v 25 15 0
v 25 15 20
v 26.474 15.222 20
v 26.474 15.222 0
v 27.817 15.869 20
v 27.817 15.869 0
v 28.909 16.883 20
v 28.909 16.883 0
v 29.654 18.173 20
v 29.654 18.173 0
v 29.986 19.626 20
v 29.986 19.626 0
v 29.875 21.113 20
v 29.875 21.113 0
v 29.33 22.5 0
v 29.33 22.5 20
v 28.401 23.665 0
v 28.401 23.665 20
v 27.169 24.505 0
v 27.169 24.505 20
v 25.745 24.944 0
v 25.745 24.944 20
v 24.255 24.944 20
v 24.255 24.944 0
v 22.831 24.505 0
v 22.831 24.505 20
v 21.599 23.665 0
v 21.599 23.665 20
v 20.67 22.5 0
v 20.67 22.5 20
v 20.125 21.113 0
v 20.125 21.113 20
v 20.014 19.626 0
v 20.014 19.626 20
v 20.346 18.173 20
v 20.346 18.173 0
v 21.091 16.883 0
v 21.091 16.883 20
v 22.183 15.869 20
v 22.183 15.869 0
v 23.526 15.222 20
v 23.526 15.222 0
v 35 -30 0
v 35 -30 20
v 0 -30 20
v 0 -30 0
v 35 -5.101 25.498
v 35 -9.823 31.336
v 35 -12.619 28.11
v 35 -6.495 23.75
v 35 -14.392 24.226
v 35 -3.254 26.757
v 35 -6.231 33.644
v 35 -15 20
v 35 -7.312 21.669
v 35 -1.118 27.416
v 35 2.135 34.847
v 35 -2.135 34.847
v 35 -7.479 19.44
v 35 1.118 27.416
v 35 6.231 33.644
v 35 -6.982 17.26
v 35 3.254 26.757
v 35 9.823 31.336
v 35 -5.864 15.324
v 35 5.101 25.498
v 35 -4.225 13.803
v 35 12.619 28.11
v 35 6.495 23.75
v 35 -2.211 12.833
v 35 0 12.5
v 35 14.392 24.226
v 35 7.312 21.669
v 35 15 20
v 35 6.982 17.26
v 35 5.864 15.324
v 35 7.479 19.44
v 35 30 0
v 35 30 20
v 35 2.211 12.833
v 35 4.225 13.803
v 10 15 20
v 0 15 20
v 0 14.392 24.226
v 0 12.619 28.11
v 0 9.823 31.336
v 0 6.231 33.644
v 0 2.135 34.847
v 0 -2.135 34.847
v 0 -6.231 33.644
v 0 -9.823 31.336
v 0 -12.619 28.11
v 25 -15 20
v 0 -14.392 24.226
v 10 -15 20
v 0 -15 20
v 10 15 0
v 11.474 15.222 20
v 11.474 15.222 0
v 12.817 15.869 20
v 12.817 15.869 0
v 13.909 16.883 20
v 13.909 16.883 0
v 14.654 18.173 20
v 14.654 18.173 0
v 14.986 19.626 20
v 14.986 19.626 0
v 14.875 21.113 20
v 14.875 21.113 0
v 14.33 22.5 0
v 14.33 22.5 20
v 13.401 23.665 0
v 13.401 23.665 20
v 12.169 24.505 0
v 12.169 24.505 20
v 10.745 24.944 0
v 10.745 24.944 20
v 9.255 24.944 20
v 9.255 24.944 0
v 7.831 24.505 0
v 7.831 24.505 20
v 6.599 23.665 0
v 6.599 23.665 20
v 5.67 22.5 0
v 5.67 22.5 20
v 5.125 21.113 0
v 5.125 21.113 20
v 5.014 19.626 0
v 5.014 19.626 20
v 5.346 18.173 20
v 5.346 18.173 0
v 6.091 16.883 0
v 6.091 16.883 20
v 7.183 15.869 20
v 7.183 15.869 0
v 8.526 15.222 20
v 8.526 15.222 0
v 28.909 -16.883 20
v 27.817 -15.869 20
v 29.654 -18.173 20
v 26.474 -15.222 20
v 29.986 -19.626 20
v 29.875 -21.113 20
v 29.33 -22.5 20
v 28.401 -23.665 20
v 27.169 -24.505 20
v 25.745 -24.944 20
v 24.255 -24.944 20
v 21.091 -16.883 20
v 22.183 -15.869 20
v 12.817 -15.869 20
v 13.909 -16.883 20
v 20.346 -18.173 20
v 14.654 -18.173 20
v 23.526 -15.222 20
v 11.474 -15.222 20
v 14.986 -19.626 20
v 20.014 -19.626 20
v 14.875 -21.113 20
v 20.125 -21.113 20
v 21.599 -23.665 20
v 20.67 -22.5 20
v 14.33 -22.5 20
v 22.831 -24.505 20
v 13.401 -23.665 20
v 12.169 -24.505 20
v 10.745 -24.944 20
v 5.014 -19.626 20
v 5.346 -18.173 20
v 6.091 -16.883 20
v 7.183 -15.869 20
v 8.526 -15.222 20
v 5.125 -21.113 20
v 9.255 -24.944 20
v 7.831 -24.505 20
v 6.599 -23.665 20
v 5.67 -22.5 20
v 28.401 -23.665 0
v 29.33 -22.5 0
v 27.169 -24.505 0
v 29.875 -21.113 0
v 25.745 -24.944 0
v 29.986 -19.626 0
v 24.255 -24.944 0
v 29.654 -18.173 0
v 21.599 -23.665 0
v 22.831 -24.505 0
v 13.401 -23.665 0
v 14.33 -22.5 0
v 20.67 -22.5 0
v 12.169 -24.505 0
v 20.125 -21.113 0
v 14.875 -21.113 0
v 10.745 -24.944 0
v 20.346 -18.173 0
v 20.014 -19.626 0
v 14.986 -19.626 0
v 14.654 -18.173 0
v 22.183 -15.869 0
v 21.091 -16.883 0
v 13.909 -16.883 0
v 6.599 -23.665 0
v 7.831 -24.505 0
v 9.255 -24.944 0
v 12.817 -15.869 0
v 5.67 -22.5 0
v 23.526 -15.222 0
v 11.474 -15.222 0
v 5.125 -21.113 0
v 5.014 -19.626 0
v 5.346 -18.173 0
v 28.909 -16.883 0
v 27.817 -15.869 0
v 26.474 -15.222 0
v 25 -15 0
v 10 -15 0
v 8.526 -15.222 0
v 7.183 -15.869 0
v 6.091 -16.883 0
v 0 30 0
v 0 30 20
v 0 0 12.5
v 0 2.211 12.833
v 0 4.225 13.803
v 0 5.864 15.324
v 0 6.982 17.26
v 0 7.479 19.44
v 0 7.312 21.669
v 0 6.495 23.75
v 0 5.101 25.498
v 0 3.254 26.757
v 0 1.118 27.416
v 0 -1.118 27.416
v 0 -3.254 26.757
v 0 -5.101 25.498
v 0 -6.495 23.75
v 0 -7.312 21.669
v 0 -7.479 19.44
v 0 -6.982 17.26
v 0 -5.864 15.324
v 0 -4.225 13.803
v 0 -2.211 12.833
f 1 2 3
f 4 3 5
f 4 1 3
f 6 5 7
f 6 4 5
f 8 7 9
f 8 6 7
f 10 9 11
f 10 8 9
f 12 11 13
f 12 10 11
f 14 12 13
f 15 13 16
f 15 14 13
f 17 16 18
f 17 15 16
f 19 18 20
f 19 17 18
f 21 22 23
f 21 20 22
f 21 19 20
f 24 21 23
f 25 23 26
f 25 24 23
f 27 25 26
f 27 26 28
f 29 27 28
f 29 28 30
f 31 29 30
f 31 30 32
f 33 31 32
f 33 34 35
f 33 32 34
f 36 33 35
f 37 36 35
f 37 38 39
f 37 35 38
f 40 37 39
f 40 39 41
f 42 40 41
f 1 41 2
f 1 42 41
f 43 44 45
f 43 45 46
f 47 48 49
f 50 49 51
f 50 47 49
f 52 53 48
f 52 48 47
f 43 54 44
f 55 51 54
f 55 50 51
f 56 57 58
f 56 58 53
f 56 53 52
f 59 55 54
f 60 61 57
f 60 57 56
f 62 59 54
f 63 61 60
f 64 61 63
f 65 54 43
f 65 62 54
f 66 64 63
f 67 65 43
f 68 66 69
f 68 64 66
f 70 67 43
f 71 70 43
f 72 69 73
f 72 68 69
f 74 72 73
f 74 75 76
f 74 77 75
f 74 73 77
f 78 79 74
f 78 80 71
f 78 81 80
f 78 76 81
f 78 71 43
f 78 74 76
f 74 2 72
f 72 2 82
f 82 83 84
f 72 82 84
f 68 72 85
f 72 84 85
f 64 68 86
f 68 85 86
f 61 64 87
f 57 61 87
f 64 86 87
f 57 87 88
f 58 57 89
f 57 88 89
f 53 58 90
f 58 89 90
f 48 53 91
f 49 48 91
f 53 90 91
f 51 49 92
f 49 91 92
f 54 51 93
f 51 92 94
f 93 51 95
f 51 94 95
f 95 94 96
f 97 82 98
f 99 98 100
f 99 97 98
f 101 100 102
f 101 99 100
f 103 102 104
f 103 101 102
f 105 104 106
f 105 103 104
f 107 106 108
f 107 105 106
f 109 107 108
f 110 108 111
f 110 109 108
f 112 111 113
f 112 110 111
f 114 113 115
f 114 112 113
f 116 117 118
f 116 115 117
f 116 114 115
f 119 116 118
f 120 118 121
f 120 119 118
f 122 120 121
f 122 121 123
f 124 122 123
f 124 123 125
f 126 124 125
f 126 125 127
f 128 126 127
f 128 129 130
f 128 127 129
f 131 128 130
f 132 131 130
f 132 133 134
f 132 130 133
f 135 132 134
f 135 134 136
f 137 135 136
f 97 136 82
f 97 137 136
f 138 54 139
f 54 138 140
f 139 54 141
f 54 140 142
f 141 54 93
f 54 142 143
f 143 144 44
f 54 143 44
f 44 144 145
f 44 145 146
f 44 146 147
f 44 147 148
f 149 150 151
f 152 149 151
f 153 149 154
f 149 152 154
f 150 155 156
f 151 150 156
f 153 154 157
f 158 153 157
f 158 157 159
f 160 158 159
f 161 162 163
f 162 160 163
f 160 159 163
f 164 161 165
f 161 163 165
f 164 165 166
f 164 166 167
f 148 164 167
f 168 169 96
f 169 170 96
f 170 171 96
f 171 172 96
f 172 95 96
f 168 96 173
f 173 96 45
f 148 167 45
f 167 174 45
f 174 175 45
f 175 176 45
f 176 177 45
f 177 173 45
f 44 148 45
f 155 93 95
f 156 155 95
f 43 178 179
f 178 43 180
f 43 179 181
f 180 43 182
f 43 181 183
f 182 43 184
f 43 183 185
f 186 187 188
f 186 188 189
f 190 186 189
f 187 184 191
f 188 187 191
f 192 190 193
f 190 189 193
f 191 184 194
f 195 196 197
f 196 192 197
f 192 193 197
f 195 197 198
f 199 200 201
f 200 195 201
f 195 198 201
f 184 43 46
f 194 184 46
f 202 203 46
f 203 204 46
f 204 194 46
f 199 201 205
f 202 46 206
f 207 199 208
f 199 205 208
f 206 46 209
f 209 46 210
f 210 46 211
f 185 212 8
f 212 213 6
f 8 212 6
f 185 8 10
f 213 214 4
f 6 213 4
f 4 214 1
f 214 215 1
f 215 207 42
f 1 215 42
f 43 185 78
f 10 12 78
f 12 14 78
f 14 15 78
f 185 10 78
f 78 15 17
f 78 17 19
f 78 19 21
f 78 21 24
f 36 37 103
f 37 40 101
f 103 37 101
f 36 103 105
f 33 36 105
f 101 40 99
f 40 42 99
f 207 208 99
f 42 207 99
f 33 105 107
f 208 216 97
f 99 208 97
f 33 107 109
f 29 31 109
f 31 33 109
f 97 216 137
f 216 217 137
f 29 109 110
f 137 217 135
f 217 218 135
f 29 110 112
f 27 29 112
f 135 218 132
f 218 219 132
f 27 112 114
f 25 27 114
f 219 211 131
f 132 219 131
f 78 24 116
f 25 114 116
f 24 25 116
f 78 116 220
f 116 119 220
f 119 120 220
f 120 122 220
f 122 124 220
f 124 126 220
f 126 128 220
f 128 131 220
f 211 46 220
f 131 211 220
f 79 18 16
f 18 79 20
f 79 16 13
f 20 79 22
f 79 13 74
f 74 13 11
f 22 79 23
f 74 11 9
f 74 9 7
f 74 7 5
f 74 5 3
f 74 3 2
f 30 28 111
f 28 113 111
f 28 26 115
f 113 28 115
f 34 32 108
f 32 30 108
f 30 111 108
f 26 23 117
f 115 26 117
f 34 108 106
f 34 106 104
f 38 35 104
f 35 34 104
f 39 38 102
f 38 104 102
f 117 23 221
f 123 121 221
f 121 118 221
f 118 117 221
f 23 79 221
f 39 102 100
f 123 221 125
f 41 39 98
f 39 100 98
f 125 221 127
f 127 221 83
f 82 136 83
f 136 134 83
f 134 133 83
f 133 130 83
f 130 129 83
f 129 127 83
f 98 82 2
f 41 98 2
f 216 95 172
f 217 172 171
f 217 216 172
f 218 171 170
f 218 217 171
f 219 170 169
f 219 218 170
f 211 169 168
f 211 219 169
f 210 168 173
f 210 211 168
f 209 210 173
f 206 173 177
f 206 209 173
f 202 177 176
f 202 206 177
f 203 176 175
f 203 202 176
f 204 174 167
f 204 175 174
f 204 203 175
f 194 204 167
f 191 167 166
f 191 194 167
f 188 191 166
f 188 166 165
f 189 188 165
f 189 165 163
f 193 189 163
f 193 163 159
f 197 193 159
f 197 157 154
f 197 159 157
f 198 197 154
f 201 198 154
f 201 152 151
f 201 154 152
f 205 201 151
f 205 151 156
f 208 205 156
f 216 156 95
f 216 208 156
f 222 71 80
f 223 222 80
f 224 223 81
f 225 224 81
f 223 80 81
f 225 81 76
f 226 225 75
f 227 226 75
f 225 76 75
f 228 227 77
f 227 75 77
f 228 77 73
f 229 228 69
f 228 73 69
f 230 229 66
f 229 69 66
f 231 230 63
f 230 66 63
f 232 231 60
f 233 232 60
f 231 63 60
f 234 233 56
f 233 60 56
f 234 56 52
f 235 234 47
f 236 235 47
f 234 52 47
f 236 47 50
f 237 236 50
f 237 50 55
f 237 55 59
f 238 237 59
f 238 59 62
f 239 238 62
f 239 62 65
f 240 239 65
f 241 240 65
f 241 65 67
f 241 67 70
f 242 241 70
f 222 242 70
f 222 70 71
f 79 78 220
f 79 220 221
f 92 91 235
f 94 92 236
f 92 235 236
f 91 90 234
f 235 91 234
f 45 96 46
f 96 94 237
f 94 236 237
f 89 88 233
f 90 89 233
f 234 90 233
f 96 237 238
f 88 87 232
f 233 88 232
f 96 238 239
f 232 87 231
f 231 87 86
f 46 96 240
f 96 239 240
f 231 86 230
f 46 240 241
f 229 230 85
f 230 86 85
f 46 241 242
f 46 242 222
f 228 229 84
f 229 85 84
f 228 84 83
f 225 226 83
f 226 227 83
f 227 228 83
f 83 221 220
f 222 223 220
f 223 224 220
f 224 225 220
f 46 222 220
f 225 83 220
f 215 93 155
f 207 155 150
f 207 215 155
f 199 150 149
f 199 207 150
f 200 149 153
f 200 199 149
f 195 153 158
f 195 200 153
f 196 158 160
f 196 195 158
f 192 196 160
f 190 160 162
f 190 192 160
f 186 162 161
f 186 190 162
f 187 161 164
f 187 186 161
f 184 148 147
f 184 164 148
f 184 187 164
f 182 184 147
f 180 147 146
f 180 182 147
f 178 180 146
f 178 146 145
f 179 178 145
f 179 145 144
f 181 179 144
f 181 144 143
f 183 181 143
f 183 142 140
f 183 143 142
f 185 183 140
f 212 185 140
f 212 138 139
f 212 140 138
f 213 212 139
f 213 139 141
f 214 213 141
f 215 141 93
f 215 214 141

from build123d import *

# Parameters (mm, degrees)
BODY_DEPTH         = 35
SKETCH2_R          = 5
FIXING_HOLES_DEPTH = 58.879184514
SKETCH3_R          = 7.5
SHAFT_HOLE_DEPTH   = 40


with BuildPart() as part:
    # Sketch1 → body (new body)
    with BuildSketch(Plane(origin=(0, 0, 0), x_dir=(0, 0, -1), z_dir=(1, 0, 0))):
        with BuildLine():
            Line((0, -30), (0, 30))
            Line((0, 30), (-20, 30))
            Line((-20, 30), (-20, 15))
            ThreePointArc((-20, 15), (-35, 0), (-20, -15))
            Line((-20, -15), (-20, -30))
            Line((-20, -30), (0, -30))
        make_face()
    extrude(amount=BODY_DEPTH)

    # Sketch2 → fixing holes (cut, through all)
    with BuildSketch(Plane.XY):
        with Locations(Location((10, 20, 0), (0, 0, 270))):
            Circle(SKETCH2_R)
        with Locations(Location((25, 20, 0), (0, 0, 270))):
            Circle(SKETCH2_R)
        with Locations(Location((10, -20, 0), (0, 0, 90))):
            Circle(SKETCH2_R)
        with Locations(Location((25, -20, 0), (0, 0, 90))):
            Circle(SKETCH2_R)
    extrude(amount=FIXING_HOLES_DEPTH, mode=Mode.SUBTRACT)

    # Sketch3 → shaft hole (cut)
    with BuildSketch(Plane(origin=(35, 0, 0), x_dir=(0, 0, -1), z_dir=(1, 0, 0))):
        with Locations((-20, 0)):
            Circle(SKETCH3_R)
    extrude(amount=-SHAFT_HOLE_DEPTH, mode=Mode.SUBTRACT)


solid = part.part
